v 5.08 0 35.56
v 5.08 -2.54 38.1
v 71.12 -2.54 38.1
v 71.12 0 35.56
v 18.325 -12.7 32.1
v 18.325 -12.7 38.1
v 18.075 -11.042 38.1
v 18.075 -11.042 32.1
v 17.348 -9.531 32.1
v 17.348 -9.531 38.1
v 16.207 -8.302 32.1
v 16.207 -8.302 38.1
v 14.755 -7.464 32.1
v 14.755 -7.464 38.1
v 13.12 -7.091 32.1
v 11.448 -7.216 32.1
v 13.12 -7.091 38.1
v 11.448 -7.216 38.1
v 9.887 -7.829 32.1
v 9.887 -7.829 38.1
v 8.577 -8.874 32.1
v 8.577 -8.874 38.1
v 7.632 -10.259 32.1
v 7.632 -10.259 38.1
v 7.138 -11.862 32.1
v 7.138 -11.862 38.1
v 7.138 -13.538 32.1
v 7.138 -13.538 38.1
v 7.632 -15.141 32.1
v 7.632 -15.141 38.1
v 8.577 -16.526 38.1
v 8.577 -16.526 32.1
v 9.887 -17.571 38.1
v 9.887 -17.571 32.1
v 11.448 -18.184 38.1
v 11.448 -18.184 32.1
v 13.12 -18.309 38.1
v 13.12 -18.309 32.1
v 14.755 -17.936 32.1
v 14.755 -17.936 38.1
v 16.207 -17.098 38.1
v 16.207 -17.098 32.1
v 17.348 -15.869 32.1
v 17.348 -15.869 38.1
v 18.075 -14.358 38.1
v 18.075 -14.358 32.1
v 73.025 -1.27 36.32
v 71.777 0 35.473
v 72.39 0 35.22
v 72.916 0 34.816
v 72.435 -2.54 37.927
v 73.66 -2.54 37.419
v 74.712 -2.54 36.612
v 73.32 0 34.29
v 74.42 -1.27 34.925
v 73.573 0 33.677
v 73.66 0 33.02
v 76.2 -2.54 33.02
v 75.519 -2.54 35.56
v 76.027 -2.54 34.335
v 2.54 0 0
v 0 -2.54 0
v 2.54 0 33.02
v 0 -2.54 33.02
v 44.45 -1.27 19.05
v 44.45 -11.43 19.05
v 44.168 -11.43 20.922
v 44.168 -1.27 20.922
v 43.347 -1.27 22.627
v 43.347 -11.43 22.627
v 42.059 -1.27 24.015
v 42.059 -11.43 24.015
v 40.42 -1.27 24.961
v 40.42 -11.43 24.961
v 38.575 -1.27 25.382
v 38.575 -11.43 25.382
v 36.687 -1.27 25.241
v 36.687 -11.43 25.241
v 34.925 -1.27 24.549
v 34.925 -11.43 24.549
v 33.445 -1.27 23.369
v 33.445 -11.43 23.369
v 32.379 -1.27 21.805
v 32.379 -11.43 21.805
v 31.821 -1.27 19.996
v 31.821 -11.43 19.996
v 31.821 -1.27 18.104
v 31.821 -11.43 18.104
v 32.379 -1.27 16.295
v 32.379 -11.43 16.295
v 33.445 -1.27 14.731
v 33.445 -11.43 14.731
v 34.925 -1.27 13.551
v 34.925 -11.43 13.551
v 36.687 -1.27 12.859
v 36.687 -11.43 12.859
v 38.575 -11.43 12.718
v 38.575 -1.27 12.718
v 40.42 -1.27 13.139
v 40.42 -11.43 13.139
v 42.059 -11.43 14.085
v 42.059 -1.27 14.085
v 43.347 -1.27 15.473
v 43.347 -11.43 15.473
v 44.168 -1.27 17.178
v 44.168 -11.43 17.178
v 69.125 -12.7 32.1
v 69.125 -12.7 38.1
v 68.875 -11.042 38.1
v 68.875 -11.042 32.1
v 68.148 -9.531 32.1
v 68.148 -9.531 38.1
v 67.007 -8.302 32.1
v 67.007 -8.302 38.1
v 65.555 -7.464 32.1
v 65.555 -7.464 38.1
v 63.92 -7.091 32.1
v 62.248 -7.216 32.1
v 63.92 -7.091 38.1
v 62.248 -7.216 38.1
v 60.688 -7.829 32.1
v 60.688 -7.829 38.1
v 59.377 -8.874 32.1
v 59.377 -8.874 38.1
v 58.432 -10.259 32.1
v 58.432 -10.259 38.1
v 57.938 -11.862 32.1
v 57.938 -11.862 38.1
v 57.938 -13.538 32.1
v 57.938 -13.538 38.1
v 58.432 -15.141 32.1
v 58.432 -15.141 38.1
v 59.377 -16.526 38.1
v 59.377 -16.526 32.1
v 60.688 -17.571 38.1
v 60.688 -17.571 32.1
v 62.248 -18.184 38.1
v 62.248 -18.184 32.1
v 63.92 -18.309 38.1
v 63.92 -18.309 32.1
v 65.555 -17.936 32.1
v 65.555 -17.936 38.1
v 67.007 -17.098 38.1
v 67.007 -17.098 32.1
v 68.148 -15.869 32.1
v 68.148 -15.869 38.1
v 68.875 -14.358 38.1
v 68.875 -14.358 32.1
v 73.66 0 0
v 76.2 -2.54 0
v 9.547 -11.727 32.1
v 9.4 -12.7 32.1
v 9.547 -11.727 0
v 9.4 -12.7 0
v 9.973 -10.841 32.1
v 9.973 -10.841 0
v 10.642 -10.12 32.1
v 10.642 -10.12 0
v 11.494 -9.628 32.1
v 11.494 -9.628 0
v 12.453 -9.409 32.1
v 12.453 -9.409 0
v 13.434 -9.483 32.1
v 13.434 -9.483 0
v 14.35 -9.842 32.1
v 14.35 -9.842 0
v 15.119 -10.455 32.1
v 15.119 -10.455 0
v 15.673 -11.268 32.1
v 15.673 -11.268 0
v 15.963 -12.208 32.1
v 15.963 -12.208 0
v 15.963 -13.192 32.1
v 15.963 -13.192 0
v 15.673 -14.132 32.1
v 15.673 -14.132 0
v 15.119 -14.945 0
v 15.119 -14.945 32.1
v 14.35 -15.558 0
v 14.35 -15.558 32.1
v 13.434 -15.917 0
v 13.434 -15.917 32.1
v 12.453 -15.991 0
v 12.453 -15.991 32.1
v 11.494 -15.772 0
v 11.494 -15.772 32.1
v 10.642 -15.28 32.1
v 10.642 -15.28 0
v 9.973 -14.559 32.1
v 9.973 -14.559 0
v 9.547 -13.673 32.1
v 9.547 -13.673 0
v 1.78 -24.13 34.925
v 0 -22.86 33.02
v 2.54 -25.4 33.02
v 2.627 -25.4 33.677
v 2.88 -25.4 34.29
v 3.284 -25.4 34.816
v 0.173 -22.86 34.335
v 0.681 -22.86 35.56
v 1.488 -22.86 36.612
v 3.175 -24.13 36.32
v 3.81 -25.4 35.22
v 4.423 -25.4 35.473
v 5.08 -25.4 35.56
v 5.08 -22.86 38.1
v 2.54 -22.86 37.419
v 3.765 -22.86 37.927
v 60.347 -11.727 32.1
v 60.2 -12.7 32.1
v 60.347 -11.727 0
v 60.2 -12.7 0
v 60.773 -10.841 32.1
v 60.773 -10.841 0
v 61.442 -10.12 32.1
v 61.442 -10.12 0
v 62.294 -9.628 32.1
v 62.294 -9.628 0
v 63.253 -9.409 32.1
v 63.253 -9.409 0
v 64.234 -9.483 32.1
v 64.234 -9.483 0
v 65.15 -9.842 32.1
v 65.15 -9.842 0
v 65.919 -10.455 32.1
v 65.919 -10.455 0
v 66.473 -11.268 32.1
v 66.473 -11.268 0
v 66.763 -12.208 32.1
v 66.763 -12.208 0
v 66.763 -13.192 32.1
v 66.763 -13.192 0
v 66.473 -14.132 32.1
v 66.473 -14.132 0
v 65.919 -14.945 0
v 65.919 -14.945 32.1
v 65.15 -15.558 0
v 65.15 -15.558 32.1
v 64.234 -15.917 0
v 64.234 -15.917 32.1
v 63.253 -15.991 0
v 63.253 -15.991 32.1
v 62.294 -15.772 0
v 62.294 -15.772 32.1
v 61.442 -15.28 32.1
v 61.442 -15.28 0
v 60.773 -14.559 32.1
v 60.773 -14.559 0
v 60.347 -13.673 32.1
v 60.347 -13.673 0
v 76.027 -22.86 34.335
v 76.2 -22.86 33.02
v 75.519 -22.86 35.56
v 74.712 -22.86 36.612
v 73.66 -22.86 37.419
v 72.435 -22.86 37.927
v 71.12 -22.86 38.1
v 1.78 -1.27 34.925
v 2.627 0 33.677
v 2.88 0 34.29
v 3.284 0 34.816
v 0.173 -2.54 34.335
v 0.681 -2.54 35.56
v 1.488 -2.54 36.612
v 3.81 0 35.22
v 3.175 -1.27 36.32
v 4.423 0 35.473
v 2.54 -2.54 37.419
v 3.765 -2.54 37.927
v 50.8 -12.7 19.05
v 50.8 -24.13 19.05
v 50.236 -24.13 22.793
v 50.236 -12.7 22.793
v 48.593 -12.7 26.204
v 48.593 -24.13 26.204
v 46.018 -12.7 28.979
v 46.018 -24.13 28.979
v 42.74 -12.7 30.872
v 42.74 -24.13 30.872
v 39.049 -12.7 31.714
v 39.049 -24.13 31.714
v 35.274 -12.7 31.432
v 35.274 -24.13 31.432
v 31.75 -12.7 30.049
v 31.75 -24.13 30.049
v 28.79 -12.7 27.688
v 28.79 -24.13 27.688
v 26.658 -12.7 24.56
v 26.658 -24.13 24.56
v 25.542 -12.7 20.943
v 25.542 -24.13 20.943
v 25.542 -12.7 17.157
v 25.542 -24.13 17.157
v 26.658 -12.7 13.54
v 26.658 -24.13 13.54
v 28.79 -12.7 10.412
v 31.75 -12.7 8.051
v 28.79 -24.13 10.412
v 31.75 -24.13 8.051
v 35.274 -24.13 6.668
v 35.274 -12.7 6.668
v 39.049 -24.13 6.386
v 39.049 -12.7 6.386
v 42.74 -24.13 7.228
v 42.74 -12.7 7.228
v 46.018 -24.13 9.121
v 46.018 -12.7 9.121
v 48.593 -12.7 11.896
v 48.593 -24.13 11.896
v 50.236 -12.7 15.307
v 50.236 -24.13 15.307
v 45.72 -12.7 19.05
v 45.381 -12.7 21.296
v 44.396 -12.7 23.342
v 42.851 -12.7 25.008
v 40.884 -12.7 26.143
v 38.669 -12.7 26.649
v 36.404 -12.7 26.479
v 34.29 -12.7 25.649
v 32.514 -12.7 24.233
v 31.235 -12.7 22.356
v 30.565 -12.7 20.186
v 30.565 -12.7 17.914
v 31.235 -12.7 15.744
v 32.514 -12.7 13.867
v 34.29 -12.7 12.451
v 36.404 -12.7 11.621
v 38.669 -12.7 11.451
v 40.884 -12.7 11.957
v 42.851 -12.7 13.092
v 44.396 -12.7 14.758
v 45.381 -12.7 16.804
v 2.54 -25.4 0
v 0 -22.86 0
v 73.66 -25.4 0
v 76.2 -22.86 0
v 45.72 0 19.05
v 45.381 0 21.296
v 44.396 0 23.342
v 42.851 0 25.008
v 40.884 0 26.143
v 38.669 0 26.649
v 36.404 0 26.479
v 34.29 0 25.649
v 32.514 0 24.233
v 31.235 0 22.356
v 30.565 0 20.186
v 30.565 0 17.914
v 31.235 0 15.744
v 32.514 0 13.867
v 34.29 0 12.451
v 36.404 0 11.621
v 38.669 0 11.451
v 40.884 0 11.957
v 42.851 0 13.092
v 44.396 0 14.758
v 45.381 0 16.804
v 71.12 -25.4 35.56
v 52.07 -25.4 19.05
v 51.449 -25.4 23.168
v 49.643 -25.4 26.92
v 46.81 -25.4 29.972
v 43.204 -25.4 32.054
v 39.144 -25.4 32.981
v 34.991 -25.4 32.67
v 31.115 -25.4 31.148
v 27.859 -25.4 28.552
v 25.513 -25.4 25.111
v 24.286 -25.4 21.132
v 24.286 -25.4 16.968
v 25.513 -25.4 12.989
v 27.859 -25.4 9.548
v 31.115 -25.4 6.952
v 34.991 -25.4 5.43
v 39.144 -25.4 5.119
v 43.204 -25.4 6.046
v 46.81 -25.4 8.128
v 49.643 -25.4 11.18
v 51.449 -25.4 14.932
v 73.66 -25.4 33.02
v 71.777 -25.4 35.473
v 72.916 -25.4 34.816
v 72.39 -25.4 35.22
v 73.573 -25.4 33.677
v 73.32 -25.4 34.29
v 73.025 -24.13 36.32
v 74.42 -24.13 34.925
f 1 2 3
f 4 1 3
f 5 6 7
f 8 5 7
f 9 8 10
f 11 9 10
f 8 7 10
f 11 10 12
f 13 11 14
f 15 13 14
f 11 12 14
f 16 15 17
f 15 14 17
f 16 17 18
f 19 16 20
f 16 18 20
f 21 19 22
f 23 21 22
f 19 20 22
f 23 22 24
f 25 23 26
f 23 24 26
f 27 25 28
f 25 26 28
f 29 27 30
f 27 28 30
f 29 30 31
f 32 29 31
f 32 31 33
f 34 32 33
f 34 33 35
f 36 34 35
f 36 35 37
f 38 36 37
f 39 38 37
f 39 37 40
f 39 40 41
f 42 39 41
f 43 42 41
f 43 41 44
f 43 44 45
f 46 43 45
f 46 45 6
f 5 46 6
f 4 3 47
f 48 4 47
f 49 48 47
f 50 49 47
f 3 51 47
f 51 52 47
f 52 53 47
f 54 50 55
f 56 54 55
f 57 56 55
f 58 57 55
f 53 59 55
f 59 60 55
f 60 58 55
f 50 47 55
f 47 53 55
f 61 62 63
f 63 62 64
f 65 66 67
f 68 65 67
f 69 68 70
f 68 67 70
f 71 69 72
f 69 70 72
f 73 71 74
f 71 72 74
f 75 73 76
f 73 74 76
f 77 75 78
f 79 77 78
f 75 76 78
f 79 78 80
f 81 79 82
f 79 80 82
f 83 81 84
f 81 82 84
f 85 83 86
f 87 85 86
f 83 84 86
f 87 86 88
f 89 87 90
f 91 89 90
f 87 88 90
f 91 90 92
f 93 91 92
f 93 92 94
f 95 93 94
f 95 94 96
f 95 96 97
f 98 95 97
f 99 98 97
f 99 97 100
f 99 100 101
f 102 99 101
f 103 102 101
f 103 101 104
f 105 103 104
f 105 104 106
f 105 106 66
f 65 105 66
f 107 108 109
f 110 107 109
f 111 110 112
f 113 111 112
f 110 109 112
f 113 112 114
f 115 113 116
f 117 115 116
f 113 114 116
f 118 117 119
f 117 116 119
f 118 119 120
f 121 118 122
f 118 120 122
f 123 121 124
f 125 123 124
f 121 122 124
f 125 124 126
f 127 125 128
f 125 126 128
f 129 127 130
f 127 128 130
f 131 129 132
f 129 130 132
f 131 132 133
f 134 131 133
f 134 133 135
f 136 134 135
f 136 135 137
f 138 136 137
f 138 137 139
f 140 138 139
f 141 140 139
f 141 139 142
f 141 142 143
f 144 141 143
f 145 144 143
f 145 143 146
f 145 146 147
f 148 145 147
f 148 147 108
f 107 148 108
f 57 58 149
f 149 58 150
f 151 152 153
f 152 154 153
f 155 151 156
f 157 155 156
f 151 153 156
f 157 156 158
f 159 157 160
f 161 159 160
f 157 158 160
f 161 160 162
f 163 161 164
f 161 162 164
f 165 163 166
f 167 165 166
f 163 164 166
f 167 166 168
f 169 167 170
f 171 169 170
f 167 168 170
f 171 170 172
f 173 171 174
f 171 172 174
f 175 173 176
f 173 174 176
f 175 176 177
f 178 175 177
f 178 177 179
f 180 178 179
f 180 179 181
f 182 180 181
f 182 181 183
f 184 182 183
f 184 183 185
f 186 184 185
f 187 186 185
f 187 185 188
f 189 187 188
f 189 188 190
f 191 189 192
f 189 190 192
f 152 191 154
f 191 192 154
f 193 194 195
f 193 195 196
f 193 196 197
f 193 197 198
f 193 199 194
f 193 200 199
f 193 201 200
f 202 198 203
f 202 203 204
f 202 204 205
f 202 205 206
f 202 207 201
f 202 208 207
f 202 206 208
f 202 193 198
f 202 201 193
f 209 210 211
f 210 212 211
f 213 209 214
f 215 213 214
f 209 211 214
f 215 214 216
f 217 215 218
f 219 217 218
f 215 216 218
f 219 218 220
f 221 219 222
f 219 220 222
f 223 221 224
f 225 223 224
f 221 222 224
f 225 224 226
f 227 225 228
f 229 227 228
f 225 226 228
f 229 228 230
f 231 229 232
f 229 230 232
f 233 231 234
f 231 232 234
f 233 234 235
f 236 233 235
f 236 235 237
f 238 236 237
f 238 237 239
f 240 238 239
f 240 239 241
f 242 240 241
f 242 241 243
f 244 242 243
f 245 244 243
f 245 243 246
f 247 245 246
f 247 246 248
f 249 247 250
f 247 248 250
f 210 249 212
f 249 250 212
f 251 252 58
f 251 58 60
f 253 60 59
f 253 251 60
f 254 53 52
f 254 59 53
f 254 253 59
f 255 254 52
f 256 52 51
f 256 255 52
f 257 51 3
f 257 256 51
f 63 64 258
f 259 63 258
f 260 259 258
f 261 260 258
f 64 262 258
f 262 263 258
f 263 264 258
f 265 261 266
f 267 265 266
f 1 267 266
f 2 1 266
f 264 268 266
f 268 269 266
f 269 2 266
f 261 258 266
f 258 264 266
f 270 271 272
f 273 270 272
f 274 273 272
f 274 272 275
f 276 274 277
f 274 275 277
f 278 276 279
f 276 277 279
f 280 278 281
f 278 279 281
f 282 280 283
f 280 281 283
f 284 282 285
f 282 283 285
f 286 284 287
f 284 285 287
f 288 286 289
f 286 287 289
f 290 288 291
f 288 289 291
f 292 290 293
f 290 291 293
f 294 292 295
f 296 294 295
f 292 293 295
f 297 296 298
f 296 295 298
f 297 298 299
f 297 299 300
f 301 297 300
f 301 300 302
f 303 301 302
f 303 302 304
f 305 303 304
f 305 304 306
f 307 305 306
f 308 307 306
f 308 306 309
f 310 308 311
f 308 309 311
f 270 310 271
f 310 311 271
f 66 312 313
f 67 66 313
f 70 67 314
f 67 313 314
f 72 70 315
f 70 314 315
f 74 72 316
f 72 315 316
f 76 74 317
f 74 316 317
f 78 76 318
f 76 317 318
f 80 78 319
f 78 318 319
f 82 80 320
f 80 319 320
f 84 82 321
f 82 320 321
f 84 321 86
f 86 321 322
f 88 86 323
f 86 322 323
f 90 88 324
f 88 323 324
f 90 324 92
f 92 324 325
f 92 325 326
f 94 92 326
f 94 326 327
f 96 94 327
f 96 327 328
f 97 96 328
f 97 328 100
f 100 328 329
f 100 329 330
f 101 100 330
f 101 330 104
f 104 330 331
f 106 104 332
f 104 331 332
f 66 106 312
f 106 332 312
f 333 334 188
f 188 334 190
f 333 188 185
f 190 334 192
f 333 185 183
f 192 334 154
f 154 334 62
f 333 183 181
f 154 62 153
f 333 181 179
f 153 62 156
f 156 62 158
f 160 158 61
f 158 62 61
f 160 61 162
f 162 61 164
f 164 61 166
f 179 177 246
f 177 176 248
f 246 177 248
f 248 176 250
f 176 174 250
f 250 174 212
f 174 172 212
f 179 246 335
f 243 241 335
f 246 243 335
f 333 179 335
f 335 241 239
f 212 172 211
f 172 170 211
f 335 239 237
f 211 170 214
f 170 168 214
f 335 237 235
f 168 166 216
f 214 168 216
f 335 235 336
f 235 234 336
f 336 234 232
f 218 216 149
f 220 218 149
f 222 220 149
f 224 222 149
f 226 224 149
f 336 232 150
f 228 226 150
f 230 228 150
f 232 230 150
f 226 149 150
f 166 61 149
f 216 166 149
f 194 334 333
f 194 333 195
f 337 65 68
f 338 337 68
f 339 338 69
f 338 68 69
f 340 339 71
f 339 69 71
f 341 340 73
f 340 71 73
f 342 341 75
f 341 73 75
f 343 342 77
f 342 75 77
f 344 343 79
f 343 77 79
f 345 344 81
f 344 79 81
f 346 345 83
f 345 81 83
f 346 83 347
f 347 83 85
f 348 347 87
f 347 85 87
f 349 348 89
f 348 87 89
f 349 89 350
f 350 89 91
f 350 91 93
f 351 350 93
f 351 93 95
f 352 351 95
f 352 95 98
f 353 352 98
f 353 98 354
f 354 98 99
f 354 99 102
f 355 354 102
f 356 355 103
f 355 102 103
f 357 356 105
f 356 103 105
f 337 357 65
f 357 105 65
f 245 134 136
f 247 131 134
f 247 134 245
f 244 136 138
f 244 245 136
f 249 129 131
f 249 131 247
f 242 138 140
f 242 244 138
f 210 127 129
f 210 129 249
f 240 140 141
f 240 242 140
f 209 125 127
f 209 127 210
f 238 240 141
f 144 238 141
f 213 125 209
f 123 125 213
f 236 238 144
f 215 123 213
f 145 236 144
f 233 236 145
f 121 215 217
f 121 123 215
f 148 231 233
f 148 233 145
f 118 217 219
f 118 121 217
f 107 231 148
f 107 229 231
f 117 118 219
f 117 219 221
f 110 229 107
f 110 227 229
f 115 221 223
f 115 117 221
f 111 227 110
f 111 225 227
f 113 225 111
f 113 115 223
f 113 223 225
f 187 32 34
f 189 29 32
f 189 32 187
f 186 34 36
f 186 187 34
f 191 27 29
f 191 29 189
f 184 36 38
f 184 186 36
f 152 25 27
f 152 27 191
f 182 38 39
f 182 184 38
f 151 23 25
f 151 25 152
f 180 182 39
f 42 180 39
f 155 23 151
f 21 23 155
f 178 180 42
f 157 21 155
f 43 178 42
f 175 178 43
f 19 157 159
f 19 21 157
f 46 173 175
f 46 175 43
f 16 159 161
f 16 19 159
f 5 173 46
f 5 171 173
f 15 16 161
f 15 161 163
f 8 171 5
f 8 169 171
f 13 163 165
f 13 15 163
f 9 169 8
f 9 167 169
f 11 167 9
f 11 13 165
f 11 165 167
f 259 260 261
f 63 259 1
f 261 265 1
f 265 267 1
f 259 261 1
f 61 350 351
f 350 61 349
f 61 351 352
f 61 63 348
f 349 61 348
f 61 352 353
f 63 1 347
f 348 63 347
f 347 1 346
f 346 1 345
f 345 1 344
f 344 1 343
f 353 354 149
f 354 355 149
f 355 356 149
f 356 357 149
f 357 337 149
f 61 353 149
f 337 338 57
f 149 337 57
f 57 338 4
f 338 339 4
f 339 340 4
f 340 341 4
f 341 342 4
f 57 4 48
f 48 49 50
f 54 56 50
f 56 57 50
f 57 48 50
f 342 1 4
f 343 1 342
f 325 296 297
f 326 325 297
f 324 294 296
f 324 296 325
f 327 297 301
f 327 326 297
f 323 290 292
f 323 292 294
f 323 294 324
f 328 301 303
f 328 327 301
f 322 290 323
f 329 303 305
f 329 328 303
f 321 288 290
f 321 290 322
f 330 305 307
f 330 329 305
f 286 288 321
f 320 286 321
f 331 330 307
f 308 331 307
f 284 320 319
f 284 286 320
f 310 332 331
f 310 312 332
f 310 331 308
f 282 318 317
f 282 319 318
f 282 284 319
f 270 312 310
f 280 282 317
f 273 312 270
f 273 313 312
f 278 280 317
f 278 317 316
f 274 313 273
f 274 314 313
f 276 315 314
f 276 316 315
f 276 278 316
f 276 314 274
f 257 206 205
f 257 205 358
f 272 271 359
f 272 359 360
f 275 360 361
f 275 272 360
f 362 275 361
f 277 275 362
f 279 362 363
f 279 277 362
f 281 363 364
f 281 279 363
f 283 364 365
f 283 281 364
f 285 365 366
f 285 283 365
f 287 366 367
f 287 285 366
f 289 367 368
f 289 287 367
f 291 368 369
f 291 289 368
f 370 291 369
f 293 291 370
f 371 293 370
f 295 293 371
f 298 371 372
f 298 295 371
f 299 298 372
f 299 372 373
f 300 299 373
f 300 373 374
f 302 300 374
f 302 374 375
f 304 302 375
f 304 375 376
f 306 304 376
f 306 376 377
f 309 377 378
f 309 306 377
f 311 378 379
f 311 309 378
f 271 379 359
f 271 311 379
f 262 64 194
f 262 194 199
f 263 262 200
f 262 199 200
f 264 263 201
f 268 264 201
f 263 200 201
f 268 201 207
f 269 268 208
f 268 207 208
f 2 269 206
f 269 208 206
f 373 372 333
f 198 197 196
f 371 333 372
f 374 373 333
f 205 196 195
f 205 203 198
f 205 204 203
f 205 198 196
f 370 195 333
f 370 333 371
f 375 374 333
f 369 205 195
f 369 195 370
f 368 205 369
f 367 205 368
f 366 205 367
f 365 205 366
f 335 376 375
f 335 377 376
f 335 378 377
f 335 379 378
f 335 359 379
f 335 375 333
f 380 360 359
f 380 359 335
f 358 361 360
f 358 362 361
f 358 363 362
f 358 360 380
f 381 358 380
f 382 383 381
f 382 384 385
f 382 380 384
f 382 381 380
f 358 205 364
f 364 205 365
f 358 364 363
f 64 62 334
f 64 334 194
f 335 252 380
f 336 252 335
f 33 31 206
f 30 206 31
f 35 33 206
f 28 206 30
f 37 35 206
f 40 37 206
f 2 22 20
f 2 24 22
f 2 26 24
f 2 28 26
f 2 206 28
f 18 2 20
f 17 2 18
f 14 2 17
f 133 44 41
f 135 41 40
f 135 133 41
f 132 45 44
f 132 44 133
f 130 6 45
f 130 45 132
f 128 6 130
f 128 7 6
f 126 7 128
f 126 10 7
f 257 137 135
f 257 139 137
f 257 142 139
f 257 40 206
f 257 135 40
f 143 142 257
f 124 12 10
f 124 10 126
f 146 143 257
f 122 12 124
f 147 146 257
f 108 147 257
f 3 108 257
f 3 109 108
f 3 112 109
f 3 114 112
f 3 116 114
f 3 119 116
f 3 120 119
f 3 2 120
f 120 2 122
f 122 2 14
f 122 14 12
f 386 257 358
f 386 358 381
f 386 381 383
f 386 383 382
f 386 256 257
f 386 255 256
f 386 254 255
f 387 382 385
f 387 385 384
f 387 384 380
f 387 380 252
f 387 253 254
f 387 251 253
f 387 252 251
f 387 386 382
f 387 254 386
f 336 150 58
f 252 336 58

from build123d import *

# Parameters (mm, degrees)
F0_W           = 76.2
F0_H           = 38.1
F1_DEPTH       = 25.4
F2_R           = 5.08
F3_R           = 12.7
F4_DEPTH       = 12.7
F5_R           = 6.35
F6_DEPTH       = 12.701
F8_D           = 6.6
F8_CBORE_D     = 11.25
F8_CBORE_DEPTH = 6
F9_SIZE        = 2.54
F10_SIZE       = 1.27


with BuildPart() as f1:
    # F0 (on Front) → F1 (new body)
    with BuildSketch(Plane.XZ):
        with Locations((38.1, 19.05)):
            Rectangle(F0_W, F0_H)
    extrude(amount=F1_DEPTH)

    # F2
    f2_edges = [f1.edges().sort_by_distance(p)[0] for p in [
        (76.2, -12.7, 38.1),
        (0, -12.7, 38.1),
    ]]
    fillet(f2_edges, radius=F2_R)

    # F3 (on face) → F4 (cut)
    with BuildSketch(Plane.XZ.offset(25.4)):
        with Locations((38.1, 19.05)):
            Circle(F3_R)
    extrude(amount=-F4_DEPTH, mode=Mode.SUBTRACT)

    # F5 (on face) → F6 (cut, through all)
    with BuildSketch(Plane.XZ.offset(12.7)):
        with Locations((38.1, 19.05)):
            Circle(F5_R)
    extrude(amount=-F6_DEPTH, mode=Mode.SUBTRACT)

    # F8 (through all)
    with Locations(Plane.XY.offset(38.1)):
        with Locations((12.7, -12.7), (63.5, -12.7)):
            CounterBoreHole(F8_D / 2, F8_CBORE_D / 2, F8_CBORE_DEPTH)

    # F9
    f9_edges = [f1.edges().sort_by_distance(p)[0] for p in [
        (38.1, -25.4, 38.1),
        (38.1, 0, 38.1),
    ]]
    chamfer(f9_edges, length=F9_SIZE)

    # F10
    f10_edges = [f1.edges().sort_by_distance(p)[0] for p in [
        (31.75, 0, 19.05),
        (31.75, -12.7, 19.05),
        (25.4, -25.4, 19.05),
    ]]
    chamfer(f10_edges, length=F10_SIZE)


solid = f1.part
